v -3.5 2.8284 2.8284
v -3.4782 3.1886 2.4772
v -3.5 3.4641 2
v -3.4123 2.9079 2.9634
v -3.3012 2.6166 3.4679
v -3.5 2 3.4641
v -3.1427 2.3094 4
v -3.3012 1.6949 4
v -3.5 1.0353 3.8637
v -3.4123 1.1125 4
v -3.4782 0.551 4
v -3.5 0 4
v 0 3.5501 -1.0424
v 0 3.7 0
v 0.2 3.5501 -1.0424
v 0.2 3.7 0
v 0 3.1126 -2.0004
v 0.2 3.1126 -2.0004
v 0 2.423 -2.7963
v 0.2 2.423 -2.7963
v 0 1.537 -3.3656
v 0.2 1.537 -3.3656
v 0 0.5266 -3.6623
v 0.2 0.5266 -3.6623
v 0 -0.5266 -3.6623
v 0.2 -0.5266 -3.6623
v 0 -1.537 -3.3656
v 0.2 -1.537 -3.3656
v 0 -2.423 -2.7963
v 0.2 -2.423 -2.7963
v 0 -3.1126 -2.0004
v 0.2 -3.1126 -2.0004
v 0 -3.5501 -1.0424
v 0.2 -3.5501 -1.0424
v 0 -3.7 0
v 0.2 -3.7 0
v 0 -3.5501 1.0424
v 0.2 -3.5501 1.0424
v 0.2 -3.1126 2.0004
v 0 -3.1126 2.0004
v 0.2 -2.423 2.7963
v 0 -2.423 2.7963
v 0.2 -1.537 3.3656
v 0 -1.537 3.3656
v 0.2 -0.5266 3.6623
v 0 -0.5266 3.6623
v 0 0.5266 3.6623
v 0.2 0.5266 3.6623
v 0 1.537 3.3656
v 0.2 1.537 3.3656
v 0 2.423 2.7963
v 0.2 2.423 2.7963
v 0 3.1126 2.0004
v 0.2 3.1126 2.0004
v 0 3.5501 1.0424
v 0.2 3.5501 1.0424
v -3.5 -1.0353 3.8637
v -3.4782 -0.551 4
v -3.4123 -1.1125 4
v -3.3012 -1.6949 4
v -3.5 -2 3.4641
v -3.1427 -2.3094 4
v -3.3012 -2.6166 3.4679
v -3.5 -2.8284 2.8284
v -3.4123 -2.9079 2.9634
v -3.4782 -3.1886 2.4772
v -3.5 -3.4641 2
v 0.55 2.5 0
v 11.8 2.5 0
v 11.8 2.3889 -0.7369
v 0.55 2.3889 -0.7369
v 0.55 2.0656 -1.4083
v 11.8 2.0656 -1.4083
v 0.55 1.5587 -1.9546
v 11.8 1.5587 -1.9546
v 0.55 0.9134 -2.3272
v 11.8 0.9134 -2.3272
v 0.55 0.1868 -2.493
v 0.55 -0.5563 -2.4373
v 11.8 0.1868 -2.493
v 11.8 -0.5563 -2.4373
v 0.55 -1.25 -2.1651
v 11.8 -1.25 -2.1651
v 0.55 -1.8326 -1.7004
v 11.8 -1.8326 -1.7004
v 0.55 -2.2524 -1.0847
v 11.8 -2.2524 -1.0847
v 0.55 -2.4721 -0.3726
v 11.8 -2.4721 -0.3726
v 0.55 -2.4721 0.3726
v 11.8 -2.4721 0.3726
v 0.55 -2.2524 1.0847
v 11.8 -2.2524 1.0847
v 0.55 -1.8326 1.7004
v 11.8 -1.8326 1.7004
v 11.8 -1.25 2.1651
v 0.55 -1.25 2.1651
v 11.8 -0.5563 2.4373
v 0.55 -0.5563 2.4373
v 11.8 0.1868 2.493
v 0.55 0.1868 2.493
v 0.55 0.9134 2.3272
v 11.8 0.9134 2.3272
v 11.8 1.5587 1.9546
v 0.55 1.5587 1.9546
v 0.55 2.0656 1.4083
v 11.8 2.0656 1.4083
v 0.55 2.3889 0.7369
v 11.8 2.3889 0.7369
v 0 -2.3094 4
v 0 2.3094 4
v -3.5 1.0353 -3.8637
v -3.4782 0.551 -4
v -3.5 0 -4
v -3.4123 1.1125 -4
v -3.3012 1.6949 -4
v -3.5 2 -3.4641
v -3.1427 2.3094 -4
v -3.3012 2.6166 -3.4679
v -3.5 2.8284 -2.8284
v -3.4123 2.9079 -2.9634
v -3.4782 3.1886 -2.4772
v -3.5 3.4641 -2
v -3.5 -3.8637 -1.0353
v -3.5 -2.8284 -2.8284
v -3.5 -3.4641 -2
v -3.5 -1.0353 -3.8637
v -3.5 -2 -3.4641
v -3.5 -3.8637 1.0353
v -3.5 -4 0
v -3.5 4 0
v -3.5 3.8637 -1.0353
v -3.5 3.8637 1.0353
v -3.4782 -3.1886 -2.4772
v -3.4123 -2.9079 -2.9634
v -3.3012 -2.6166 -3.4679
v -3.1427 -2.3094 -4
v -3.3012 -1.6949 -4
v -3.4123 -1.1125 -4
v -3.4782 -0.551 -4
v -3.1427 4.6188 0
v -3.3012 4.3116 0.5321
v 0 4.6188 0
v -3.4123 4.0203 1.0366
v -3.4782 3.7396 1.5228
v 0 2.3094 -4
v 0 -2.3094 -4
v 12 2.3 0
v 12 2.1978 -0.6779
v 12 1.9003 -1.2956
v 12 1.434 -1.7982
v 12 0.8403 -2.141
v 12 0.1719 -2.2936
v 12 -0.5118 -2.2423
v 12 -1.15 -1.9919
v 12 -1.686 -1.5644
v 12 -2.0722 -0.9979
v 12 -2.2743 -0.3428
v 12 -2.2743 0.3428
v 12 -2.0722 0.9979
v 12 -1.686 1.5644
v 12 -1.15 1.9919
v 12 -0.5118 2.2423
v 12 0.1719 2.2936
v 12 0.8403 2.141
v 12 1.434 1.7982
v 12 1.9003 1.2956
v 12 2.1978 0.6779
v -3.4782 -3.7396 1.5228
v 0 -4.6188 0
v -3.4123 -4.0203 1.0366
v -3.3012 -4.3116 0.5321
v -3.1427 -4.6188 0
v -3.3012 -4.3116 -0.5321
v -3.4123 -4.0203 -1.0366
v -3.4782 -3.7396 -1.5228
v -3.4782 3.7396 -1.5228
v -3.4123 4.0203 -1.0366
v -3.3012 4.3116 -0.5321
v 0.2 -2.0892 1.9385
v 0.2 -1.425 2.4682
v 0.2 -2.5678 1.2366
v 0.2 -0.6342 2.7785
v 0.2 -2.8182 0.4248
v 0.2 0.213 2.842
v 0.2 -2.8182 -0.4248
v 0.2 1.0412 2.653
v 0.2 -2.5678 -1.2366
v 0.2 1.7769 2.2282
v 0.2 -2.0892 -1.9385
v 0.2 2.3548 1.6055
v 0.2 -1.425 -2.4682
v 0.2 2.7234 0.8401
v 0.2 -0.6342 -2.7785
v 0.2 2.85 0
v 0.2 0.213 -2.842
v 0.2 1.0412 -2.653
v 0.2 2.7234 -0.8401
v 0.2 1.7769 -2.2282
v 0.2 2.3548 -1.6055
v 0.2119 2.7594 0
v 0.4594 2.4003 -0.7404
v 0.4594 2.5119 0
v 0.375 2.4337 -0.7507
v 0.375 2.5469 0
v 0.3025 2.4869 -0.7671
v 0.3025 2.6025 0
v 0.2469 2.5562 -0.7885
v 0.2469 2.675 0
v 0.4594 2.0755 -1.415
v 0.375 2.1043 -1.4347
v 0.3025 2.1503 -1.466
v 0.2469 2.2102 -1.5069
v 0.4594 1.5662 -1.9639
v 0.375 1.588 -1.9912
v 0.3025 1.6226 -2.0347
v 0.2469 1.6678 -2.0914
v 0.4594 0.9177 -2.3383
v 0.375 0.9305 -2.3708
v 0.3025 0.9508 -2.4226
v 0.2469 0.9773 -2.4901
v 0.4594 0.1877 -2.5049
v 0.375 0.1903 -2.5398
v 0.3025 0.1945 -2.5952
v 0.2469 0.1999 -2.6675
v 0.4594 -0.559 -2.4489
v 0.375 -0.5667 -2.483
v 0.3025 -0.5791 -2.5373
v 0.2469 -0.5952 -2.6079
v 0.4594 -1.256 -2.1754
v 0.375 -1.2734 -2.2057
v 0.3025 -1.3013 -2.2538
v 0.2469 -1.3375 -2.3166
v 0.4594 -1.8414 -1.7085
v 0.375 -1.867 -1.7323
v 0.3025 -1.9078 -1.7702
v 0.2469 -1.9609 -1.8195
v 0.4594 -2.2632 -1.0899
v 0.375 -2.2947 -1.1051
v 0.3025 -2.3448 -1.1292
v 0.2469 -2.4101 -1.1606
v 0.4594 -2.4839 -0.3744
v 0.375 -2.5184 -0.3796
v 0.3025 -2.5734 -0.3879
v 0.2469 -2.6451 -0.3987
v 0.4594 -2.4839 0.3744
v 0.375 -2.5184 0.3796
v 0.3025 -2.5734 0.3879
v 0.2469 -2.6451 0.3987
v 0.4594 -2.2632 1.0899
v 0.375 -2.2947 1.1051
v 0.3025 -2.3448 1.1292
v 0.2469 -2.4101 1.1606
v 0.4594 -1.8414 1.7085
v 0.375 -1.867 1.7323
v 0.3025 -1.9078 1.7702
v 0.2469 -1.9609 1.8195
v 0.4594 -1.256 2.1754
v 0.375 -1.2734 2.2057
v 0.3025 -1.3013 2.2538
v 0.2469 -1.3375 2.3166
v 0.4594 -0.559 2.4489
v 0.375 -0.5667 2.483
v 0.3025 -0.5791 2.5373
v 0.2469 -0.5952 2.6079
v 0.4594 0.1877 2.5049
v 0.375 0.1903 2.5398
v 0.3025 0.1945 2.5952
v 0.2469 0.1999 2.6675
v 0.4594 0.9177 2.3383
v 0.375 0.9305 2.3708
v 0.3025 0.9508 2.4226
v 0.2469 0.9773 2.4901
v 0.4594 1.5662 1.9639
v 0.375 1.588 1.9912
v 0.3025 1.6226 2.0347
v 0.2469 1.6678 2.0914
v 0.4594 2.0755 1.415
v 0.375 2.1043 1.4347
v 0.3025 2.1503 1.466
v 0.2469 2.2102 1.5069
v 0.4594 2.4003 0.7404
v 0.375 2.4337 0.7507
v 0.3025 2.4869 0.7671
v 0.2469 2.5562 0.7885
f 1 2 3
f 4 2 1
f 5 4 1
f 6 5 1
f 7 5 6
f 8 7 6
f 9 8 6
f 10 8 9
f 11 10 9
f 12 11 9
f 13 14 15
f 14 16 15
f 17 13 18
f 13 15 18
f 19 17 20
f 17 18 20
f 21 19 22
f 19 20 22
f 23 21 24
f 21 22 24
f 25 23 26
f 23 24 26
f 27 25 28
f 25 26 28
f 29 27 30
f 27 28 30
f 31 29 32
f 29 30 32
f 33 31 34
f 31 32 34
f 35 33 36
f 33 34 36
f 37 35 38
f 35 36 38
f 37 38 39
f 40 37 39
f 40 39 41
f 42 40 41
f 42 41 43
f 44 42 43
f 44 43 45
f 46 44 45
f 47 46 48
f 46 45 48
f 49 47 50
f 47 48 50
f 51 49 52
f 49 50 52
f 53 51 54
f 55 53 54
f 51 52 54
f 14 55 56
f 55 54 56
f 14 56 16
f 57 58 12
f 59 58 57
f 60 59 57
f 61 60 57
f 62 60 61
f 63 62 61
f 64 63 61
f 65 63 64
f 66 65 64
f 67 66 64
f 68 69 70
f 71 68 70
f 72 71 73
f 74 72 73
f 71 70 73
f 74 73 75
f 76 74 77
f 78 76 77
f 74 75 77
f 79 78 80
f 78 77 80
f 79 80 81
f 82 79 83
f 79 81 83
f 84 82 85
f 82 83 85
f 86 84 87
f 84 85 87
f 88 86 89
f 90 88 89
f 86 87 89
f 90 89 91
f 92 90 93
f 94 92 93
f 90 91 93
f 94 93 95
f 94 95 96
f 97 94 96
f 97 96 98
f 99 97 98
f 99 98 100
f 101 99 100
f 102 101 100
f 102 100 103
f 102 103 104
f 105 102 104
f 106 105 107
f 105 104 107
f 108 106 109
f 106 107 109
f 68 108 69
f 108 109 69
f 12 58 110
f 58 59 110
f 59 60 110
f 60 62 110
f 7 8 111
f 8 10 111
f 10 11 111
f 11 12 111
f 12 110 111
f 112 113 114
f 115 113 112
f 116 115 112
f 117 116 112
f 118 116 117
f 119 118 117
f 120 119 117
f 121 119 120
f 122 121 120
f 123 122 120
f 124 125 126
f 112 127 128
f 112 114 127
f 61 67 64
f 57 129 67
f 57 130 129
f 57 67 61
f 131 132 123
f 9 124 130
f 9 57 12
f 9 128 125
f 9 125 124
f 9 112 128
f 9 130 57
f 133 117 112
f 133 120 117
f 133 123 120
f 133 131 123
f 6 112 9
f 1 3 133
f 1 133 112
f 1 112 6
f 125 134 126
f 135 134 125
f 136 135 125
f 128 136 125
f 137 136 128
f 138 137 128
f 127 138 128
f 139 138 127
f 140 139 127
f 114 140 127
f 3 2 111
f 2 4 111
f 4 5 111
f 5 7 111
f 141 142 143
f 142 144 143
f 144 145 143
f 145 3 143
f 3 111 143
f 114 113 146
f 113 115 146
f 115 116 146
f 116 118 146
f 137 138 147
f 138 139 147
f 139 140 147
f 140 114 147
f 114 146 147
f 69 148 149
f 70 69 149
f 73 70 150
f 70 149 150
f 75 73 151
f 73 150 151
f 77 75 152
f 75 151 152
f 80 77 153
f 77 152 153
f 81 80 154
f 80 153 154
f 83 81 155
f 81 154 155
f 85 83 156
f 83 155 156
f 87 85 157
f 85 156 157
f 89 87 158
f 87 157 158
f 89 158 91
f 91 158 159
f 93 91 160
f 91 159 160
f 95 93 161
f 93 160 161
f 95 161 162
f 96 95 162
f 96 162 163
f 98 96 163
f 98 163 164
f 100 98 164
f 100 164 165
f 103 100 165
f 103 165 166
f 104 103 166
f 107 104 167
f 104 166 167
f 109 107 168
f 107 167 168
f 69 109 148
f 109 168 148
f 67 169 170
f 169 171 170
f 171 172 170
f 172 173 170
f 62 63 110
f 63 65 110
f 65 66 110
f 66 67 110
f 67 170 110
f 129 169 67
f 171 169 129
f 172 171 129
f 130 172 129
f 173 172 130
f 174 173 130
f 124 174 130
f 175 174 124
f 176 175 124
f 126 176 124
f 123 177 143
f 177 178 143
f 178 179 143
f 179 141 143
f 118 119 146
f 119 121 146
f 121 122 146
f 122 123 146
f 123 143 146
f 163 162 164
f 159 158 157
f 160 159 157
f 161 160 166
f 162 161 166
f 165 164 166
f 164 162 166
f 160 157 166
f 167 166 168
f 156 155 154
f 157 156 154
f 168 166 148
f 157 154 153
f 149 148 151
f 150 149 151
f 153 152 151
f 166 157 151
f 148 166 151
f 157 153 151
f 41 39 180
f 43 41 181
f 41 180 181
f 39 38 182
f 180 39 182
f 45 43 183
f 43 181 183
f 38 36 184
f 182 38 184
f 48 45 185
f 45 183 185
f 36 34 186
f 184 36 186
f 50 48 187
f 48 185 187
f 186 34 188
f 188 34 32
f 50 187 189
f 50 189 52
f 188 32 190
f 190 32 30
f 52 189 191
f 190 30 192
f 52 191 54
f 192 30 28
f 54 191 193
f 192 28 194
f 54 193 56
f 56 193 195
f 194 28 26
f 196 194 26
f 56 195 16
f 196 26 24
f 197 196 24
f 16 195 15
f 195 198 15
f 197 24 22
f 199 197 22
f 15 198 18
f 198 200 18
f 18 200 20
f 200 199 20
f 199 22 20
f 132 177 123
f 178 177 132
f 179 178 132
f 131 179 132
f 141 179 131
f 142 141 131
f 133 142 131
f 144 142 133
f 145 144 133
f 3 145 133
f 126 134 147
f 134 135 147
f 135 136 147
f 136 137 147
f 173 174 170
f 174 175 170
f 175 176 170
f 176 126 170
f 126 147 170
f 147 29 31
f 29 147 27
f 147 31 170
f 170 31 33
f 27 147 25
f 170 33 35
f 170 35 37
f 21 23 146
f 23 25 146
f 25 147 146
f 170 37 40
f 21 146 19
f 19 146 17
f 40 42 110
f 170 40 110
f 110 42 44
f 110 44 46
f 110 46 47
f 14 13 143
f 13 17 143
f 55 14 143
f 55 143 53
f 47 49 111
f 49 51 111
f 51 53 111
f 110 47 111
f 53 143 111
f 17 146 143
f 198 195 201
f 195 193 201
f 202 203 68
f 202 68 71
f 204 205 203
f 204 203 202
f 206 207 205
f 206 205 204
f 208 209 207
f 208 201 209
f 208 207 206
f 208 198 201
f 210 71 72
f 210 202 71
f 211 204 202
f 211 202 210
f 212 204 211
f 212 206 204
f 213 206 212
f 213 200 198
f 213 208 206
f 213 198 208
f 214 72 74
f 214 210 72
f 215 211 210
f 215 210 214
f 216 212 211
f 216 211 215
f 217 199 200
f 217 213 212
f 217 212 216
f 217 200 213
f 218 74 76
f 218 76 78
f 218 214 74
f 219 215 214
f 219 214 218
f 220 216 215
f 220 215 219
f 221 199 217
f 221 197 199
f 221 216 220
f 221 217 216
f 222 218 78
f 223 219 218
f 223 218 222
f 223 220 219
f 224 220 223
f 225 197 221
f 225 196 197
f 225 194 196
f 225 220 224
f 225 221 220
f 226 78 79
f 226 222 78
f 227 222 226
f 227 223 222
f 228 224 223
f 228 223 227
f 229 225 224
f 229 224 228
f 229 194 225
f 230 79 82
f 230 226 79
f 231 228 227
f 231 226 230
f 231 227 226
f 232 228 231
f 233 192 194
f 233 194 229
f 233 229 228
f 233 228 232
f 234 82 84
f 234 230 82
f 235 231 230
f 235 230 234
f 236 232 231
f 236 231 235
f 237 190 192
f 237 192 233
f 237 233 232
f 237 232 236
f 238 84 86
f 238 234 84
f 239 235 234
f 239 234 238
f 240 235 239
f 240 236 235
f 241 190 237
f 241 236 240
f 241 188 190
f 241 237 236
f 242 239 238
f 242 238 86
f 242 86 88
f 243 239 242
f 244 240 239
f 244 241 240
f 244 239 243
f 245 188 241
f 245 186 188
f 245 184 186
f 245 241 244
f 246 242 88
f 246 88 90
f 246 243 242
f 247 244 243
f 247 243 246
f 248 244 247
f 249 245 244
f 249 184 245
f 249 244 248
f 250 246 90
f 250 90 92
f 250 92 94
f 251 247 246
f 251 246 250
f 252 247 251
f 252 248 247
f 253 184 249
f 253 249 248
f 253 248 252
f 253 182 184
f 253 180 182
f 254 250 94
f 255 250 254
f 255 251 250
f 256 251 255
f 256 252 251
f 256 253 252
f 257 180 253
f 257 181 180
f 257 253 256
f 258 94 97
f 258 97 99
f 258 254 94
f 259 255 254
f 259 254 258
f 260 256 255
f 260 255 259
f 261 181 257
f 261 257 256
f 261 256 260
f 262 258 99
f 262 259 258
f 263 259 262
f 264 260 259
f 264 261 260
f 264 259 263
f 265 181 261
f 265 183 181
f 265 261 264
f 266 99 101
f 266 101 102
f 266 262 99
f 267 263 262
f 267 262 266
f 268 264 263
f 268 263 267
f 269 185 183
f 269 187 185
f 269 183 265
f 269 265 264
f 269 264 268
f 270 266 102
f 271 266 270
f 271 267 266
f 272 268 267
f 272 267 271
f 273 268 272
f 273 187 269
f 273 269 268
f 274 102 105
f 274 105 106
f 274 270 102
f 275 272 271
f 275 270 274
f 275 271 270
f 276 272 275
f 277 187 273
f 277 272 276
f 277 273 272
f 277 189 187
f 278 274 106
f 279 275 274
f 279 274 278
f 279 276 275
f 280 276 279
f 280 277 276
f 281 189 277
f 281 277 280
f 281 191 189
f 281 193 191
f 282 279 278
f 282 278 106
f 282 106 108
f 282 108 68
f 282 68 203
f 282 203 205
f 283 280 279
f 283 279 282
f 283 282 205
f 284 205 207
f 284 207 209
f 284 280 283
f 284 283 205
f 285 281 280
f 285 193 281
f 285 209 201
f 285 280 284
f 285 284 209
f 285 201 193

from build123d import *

# Parameters (mm, degrees)
ESTRUSIONE_ESTRUSIONE1_DEPTH = 3.5
SMUSSO1_SIZE                 = 0.2
RACCORDO1_R                  = 0.35


with BuildPart() as part:
    # Schizzo1 → Rivoluzione1 (revolve)
    with BuildSketch(Plane.XY):
        Polygon((0.2, 2.5), (12, 2.5), (12, 0), (0, 0), (0, 3.7), (0.2, 3.7), align=None)
    revolve(axis=Axis((12, 0, 0), (-1, 0, 0)))

    # Schizzo2 → Estrusione-Estrusione1 (add)
    with BuildSketch(Plane.ZY):
        Polygon((0, -4.618802154), (4, -2.309401077), (4, 2.309401077), (0, 4.618802154), (-4, 2.309401077), (-4, -2.309401077), align=None)
    extrude(amount=ESTRUSIONE_ESTRUSIONE1_DEPTH)

    # Schizzo3 → Taglia-Rivoluzione3 (revolve, cut)
    with BuildSketch(Plane.XY):
        Polygon((-3.5, 4), (-3.14273441, 4.618802154), (-3.5, 4.618802154), align=None)
    revolve(axis=Axis((0.2, 0, 0), (1, 0, 0)), mode=Mode.SUBTRACT)

    # Smusso1
    smusso1_edges = [part.edges().sort_by_distance(p)[0] for p in [
        (12, -2.5, 0),
    ]]
    chamfer(smusso1_edges, length=SMUSSO1_SIZE)

    # Raccordo1
    raccordo1_edges = [part.edges().sort_by_distance(p)[0] for p in [
        (0.2, -2.5, 0),
    ]]
    fillet(raccordo1_edges, radius=RACCORDO1_R)


solid = part.part
